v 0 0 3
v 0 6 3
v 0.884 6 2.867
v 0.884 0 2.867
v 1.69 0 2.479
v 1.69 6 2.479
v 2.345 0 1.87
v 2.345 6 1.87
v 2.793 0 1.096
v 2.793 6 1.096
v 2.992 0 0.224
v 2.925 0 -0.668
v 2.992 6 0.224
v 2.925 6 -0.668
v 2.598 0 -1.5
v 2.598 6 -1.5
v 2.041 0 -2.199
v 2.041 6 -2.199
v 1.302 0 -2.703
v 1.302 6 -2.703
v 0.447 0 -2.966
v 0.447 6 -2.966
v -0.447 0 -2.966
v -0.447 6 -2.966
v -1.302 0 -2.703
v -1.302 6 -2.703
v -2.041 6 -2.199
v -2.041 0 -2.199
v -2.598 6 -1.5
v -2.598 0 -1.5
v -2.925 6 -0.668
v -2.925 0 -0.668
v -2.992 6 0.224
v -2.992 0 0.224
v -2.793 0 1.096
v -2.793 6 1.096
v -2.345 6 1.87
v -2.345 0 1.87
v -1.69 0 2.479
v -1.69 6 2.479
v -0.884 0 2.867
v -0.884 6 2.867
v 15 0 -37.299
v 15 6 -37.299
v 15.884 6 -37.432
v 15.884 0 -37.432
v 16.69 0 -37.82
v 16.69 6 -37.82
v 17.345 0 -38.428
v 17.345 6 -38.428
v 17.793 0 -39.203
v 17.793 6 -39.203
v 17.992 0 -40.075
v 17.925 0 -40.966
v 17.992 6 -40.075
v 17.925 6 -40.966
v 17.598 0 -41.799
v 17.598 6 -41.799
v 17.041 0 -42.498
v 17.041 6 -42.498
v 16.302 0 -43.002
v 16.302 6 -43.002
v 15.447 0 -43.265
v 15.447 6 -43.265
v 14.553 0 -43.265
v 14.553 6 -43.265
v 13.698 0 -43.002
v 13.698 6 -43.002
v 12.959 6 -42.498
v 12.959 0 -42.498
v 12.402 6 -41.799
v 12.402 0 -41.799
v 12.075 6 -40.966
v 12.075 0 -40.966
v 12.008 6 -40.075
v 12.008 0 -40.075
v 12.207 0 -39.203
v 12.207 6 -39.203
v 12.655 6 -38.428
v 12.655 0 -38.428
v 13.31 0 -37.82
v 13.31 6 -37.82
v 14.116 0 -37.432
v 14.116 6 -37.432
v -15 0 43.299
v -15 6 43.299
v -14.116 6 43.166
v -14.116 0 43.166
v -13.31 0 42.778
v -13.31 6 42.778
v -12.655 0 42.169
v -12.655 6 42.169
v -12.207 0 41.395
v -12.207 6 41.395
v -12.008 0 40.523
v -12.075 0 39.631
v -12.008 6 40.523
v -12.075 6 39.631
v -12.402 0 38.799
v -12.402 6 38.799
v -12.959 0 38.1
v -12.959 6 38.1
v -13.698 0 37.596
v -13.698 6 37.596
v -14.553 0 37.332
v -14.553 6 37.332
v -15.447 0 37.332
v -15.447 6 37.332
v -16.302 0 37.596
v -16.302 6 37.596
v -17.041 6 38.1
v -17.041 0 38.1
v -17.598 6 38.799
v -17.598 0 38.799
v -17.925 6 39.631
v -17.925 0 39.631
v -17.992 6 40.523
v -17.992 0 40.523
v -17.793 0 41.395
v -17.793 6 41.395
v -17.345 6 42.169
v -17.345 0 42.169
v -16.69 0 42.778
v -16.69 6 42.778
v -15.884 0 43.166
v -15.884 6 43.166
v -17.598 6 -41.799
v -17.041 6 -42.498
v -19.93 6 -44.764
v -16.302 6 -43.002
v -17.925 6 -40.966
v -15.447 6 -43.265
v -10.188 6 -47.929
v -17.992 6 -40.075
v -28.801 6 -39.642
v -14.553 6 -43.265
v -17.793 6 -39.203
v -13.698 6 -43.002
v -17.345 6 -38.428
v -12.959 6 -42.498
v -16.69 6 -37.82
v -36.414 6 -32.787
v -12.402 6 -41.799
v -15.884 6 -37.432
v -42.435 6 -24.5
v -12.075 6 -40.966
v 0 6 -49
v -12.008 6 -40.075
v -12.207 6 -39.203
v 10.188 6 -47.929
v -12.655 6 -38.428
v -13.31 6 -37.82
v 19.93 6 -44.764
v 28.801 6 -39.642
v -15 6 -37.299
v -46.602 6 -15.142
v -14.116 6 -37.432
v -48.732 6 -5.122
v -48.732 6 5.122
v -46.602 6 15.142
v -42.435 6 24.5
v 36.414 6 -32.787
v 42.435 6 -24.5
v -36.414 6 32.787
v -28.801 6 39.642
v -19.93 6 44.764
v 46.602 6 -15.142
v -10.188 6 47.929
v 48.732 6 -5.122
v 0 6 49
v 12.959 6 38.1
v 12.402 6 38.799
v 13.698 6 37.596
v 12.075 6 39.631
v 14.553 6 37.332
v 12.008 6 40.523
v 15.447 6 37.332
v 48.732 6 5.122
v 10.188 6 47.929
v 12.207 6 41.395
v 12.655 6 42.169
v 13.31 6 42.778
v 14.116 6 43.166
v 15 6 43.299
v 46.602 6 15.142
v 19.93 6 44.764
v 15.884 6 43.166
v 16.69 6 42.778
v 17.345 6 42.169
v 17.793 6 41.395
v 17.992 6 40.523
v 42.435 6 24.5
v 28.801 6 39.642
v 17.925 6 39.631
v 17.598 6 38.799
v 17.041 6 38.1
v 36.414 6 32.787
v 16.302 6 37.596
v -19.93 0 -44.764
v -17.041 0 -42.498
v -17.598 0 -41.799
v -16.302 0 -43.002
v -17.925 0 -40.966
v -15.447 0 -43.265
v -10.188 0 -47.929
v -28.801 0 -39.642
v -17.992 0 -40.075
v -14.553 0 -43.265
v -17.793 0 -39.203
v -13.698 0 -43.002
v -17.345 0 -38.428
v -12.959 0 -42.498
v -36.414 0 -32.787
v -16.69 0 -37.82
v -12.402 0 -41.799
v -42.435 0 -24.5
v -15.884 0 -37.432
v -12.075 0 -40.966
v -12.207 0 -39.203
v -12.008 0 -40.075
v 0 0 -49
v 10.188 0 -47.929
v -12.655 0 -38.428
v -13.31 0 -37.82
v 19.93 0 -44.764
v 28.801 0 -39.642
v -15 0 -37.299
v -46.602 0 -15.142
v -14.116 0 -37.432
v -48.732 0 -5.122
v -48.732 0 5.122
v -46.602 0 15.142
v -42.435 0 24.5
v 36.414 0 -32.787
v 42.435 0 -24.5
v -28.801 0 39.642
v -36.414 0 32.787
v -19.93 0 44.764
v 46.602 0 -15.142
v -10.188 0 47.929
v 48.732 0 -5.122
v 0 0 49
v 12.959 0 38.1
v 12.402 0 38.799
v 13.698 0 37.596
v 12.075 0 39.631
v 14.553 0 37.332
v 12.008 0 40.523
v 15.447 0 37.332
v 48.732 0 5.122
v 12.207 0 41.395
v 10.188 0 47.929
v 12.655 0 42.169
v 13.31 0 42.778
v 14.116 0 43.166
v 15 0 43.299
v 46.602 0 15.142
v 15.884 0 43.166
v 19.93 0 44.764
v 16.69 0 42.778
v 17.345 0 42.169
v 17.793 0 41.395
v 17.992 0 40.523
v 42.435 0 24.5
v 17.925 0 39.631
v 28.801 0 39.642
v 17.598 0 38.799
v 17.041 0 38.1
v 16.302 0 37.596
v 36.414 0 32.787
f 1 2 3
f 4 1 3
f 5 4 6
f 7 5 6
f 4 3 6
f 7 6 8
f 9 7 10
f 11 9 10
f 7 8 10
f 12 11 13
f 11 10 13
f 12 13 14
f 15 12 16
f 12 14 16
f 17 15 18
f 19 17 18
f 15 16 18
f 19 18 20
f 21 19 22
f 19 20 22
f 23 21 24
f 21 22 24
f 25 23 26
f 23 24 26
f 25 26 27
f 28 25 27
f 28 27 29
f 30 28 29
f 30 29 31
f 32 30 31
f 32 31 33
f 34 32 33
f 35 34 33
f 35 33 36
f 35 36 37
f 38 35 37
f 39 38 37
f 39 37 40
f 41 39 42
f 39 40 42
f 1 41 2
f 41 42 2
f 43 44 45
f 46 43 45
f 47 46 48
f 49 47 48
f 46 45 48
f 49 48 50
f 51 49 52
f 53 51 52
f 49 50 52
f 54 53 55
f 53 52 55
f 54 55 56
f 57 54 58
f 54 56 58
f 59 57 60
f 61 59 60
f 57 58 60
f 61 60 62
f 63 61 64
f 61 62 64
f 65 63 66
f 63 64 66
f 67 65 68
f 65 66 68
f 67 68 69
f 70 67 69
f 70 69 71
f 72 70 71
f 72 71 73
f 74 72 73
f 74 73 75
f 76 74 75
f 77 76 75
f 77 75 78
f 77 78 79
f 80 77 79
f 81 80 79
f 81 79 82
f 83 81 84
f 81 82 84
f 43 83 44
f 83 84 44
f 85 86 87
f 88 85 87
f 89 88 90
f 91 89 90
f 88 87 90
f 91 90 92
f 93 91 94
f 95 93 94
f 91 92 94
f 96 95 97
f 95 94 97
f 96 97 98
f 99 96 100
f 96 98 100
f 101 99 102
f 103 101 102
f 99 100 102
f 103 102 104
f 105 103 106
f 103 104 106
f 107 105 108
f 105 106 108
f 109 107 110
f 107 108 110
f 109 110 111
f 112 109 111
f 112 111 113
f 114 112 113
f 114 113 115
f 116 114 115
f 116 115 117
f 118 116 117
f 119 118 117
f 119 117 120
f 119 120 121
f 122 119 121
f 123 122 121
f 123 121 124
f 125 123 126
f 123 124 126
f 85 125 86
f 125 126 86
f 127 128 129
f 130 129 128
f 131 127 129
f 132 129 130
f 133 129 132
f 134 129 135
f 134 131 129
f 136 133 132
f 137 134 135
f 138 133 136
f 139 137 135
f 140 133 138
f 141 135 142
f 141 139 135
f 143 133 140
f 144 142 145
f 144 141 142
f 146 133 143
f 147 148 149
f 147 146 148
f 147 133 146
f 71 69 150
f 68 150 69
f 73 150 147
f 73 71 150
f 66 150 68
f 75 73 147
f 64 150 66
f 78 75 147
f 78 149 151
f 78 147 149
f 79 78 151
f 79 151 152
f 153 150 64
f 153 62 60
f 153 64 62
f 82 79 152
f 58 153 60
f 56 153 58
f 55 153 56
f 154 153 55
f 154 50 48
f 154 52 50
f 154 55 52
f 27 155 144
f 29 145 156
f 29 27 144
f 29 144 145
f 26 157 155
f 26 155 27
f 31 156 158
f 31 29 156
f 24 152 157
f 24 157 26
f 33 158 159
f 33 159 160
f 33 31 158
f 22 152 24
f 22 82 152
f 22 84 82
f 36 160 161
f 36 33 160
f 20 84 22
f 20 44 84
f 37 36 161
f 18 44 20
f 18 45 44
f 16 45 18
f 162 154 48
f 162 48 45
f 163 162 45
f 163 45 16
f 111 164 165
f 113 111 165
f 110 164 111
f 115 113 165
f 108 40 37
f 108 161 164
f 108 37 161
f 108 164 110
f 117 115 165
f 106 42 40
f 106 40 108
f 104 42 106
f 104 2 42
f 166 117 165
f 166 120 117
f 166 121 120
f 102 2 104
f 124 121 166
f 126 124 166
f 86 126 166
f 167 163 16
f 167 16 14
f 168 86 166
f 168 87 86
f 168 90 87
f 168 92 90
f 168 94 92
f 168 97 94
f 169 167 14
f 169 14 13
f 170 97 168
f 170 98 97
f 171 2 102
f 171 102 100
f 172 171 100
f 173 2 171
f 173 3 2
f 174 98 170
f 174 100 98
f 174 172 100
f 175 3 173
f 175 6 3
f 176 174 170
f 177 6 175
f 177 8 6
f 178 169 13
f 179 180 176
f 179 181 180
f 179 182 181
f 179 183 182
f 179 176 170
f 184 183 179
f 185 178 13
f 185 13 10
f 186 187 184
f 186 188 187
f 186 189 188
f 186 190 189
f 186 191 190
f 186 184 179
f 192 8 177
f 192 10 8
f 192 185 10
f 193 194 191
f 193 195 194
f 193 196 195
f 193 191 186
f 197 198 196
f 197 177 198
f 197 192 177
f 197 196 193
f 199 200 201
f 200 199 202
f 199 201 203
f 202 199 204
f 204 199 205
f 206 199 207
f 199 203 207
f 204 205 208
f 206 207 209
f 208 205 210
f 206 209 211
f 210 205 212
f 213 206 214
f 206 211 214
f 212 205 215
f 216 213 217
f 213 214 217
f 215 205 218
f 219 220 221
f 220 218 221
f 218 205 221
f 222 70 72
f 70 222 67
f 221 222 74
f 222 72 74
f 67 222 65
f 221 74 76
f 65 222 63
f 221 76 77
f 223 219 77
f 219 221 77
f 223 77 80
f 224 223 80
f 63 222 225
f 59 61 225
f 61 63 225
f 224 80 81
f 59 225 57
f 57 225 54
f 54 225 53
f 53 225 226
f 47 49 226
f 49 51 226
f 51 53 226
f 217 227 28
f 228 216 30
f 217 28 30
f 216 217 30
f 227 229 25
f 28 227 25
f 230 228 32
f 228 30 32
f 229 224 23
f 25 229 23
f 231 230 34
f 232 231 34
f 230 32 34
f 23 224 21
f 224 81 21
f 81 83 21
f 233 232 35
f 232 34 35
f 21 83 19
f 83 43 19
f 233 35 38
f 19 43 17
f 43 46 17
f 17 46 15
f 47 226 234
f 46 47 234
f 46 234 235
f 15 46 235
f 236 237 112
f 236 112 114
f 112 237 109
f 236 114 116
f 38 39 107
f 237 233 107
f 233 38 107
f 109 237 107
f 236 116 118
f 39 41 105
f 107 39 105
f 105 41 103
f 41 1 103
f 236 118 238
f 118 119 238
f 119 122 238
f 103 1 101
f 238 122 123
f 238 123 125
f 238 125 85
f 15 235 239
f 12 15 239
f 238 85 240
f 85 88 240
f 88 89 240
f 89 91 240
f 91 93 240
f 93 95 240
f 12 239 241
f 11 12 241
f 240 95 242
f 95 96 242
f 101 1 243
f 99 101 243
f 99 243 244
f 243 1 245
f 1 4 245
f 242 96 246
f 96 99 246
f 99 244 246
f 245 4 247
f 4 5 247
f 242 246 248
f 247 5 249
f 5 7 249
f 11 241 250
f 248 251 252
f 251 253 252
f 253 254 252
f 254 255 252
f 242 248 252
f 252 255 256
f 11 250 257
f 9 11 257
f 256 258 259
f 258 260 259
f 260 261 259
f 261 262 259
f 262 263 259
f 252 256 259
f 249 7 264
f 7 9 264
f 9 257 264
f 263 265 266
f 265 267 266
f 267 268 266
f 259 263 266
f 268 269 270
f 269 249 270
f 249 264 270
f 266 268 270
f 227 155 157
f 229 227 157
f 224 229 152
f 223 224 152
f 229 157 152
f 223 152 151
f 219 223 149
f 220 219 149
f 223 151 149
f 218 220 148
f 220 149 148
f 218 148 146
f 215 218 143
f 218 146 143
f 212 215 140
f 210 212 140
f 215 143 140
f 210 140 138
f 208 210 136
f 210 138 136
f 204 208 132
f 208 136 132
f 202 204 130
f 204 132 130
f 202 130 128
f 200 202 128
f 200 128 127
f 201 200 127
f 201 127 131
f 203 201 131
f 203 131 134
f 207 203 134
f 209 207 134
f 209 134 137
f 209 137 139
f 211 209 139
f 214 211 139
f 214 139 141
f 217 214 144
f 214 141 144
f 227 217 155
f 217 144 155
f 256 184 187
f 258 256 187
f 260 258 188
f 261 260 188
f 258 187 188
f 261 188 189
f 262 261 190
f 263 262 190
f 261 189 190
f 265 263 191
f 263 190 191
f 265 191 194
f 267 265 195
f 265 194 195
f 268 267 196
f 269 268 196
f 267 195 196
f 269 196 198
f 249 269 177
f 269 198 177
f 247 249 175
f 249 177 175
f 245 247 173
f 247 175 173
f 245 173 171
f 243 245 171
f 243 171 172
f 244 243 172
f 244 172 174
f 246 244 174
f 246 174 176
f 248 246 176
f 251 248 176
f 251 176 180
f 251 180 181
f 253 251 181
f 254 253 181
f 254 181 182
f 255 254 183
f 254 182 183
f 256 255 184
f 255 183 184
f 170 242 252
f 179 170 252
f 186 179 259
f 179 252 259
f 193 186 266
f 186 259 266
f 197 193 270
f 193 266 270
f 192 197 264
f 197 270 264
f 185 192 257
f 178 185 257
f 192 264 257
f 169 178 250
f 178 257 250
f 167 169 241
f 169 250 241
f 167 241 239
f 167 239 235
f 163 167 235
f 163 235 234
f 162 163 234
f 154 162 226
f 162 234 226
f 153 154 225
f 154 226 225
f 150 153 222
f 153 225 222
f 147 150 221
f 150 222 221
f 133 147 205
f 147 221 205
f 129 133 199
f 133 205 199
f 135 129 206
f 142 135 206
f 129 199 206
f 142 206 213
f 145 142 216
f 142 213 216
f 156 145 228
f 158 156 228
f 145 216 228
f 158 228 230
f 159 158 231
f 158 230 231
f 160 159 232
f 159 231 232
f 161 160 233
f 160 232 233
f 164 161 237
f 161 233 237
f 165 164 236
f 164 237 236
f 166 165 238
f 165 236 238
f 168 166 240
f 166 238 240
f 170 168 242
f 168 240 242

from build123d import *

# Parameters (mm, degrees)
SKETCH1_R           = 49
BOSS_EXTRUDE1_DEPTH = 6
SKETCH2_R           = 3
CUT_EXTRUDE1_DEPTH  = 6


with BuildPart() as part:
    # Sketch1 → Boss-Extrude1 (new body)
    with BuildSketch(Plane(origin=(0, 0, 0), x_dir=(1, 0, 0), z_dir=(0, 1, 0))):
        with Locations(Location((0, 0, 0), (0, 0, 270))):
            Circle(SKETCH1_R)
    extrude(amount=BOSS_EXTRUDE1_DEPTH)

    # Sketch2 → Cut-Extrude1 (cut)
    with BuildSketch(Plane(origin=(0, 6, 0), x_dir=(1, 0, 0), z_dir=(0, 1, 0))):
        with Locations(Location((-15, 40.298883359, 0), (0, 0, 270))):
            Circle(SKETCH2_R)
        with Locations(Location((15, 40.298883359, 0), (0, 0, 270))):
            Circle(SKETCH2_R)
        with Locations(Location((0, 0, 0), (0, 0, 270))):
            Circle(SKETCH2_R)
        with Locations(Location((15, -40.298883359, 0), (0, 0, 270))):
            Circle(SKETCH2_R)
        with Locations(Location((-15, -40.298883359, 0), (0, 0, 270))):
            Circle(SKETCH2_R)
    extrude(amount=-CUT_EXTRUDE1_DEPTH, mode=Mode.SUBTRACT)


solid = part.part
